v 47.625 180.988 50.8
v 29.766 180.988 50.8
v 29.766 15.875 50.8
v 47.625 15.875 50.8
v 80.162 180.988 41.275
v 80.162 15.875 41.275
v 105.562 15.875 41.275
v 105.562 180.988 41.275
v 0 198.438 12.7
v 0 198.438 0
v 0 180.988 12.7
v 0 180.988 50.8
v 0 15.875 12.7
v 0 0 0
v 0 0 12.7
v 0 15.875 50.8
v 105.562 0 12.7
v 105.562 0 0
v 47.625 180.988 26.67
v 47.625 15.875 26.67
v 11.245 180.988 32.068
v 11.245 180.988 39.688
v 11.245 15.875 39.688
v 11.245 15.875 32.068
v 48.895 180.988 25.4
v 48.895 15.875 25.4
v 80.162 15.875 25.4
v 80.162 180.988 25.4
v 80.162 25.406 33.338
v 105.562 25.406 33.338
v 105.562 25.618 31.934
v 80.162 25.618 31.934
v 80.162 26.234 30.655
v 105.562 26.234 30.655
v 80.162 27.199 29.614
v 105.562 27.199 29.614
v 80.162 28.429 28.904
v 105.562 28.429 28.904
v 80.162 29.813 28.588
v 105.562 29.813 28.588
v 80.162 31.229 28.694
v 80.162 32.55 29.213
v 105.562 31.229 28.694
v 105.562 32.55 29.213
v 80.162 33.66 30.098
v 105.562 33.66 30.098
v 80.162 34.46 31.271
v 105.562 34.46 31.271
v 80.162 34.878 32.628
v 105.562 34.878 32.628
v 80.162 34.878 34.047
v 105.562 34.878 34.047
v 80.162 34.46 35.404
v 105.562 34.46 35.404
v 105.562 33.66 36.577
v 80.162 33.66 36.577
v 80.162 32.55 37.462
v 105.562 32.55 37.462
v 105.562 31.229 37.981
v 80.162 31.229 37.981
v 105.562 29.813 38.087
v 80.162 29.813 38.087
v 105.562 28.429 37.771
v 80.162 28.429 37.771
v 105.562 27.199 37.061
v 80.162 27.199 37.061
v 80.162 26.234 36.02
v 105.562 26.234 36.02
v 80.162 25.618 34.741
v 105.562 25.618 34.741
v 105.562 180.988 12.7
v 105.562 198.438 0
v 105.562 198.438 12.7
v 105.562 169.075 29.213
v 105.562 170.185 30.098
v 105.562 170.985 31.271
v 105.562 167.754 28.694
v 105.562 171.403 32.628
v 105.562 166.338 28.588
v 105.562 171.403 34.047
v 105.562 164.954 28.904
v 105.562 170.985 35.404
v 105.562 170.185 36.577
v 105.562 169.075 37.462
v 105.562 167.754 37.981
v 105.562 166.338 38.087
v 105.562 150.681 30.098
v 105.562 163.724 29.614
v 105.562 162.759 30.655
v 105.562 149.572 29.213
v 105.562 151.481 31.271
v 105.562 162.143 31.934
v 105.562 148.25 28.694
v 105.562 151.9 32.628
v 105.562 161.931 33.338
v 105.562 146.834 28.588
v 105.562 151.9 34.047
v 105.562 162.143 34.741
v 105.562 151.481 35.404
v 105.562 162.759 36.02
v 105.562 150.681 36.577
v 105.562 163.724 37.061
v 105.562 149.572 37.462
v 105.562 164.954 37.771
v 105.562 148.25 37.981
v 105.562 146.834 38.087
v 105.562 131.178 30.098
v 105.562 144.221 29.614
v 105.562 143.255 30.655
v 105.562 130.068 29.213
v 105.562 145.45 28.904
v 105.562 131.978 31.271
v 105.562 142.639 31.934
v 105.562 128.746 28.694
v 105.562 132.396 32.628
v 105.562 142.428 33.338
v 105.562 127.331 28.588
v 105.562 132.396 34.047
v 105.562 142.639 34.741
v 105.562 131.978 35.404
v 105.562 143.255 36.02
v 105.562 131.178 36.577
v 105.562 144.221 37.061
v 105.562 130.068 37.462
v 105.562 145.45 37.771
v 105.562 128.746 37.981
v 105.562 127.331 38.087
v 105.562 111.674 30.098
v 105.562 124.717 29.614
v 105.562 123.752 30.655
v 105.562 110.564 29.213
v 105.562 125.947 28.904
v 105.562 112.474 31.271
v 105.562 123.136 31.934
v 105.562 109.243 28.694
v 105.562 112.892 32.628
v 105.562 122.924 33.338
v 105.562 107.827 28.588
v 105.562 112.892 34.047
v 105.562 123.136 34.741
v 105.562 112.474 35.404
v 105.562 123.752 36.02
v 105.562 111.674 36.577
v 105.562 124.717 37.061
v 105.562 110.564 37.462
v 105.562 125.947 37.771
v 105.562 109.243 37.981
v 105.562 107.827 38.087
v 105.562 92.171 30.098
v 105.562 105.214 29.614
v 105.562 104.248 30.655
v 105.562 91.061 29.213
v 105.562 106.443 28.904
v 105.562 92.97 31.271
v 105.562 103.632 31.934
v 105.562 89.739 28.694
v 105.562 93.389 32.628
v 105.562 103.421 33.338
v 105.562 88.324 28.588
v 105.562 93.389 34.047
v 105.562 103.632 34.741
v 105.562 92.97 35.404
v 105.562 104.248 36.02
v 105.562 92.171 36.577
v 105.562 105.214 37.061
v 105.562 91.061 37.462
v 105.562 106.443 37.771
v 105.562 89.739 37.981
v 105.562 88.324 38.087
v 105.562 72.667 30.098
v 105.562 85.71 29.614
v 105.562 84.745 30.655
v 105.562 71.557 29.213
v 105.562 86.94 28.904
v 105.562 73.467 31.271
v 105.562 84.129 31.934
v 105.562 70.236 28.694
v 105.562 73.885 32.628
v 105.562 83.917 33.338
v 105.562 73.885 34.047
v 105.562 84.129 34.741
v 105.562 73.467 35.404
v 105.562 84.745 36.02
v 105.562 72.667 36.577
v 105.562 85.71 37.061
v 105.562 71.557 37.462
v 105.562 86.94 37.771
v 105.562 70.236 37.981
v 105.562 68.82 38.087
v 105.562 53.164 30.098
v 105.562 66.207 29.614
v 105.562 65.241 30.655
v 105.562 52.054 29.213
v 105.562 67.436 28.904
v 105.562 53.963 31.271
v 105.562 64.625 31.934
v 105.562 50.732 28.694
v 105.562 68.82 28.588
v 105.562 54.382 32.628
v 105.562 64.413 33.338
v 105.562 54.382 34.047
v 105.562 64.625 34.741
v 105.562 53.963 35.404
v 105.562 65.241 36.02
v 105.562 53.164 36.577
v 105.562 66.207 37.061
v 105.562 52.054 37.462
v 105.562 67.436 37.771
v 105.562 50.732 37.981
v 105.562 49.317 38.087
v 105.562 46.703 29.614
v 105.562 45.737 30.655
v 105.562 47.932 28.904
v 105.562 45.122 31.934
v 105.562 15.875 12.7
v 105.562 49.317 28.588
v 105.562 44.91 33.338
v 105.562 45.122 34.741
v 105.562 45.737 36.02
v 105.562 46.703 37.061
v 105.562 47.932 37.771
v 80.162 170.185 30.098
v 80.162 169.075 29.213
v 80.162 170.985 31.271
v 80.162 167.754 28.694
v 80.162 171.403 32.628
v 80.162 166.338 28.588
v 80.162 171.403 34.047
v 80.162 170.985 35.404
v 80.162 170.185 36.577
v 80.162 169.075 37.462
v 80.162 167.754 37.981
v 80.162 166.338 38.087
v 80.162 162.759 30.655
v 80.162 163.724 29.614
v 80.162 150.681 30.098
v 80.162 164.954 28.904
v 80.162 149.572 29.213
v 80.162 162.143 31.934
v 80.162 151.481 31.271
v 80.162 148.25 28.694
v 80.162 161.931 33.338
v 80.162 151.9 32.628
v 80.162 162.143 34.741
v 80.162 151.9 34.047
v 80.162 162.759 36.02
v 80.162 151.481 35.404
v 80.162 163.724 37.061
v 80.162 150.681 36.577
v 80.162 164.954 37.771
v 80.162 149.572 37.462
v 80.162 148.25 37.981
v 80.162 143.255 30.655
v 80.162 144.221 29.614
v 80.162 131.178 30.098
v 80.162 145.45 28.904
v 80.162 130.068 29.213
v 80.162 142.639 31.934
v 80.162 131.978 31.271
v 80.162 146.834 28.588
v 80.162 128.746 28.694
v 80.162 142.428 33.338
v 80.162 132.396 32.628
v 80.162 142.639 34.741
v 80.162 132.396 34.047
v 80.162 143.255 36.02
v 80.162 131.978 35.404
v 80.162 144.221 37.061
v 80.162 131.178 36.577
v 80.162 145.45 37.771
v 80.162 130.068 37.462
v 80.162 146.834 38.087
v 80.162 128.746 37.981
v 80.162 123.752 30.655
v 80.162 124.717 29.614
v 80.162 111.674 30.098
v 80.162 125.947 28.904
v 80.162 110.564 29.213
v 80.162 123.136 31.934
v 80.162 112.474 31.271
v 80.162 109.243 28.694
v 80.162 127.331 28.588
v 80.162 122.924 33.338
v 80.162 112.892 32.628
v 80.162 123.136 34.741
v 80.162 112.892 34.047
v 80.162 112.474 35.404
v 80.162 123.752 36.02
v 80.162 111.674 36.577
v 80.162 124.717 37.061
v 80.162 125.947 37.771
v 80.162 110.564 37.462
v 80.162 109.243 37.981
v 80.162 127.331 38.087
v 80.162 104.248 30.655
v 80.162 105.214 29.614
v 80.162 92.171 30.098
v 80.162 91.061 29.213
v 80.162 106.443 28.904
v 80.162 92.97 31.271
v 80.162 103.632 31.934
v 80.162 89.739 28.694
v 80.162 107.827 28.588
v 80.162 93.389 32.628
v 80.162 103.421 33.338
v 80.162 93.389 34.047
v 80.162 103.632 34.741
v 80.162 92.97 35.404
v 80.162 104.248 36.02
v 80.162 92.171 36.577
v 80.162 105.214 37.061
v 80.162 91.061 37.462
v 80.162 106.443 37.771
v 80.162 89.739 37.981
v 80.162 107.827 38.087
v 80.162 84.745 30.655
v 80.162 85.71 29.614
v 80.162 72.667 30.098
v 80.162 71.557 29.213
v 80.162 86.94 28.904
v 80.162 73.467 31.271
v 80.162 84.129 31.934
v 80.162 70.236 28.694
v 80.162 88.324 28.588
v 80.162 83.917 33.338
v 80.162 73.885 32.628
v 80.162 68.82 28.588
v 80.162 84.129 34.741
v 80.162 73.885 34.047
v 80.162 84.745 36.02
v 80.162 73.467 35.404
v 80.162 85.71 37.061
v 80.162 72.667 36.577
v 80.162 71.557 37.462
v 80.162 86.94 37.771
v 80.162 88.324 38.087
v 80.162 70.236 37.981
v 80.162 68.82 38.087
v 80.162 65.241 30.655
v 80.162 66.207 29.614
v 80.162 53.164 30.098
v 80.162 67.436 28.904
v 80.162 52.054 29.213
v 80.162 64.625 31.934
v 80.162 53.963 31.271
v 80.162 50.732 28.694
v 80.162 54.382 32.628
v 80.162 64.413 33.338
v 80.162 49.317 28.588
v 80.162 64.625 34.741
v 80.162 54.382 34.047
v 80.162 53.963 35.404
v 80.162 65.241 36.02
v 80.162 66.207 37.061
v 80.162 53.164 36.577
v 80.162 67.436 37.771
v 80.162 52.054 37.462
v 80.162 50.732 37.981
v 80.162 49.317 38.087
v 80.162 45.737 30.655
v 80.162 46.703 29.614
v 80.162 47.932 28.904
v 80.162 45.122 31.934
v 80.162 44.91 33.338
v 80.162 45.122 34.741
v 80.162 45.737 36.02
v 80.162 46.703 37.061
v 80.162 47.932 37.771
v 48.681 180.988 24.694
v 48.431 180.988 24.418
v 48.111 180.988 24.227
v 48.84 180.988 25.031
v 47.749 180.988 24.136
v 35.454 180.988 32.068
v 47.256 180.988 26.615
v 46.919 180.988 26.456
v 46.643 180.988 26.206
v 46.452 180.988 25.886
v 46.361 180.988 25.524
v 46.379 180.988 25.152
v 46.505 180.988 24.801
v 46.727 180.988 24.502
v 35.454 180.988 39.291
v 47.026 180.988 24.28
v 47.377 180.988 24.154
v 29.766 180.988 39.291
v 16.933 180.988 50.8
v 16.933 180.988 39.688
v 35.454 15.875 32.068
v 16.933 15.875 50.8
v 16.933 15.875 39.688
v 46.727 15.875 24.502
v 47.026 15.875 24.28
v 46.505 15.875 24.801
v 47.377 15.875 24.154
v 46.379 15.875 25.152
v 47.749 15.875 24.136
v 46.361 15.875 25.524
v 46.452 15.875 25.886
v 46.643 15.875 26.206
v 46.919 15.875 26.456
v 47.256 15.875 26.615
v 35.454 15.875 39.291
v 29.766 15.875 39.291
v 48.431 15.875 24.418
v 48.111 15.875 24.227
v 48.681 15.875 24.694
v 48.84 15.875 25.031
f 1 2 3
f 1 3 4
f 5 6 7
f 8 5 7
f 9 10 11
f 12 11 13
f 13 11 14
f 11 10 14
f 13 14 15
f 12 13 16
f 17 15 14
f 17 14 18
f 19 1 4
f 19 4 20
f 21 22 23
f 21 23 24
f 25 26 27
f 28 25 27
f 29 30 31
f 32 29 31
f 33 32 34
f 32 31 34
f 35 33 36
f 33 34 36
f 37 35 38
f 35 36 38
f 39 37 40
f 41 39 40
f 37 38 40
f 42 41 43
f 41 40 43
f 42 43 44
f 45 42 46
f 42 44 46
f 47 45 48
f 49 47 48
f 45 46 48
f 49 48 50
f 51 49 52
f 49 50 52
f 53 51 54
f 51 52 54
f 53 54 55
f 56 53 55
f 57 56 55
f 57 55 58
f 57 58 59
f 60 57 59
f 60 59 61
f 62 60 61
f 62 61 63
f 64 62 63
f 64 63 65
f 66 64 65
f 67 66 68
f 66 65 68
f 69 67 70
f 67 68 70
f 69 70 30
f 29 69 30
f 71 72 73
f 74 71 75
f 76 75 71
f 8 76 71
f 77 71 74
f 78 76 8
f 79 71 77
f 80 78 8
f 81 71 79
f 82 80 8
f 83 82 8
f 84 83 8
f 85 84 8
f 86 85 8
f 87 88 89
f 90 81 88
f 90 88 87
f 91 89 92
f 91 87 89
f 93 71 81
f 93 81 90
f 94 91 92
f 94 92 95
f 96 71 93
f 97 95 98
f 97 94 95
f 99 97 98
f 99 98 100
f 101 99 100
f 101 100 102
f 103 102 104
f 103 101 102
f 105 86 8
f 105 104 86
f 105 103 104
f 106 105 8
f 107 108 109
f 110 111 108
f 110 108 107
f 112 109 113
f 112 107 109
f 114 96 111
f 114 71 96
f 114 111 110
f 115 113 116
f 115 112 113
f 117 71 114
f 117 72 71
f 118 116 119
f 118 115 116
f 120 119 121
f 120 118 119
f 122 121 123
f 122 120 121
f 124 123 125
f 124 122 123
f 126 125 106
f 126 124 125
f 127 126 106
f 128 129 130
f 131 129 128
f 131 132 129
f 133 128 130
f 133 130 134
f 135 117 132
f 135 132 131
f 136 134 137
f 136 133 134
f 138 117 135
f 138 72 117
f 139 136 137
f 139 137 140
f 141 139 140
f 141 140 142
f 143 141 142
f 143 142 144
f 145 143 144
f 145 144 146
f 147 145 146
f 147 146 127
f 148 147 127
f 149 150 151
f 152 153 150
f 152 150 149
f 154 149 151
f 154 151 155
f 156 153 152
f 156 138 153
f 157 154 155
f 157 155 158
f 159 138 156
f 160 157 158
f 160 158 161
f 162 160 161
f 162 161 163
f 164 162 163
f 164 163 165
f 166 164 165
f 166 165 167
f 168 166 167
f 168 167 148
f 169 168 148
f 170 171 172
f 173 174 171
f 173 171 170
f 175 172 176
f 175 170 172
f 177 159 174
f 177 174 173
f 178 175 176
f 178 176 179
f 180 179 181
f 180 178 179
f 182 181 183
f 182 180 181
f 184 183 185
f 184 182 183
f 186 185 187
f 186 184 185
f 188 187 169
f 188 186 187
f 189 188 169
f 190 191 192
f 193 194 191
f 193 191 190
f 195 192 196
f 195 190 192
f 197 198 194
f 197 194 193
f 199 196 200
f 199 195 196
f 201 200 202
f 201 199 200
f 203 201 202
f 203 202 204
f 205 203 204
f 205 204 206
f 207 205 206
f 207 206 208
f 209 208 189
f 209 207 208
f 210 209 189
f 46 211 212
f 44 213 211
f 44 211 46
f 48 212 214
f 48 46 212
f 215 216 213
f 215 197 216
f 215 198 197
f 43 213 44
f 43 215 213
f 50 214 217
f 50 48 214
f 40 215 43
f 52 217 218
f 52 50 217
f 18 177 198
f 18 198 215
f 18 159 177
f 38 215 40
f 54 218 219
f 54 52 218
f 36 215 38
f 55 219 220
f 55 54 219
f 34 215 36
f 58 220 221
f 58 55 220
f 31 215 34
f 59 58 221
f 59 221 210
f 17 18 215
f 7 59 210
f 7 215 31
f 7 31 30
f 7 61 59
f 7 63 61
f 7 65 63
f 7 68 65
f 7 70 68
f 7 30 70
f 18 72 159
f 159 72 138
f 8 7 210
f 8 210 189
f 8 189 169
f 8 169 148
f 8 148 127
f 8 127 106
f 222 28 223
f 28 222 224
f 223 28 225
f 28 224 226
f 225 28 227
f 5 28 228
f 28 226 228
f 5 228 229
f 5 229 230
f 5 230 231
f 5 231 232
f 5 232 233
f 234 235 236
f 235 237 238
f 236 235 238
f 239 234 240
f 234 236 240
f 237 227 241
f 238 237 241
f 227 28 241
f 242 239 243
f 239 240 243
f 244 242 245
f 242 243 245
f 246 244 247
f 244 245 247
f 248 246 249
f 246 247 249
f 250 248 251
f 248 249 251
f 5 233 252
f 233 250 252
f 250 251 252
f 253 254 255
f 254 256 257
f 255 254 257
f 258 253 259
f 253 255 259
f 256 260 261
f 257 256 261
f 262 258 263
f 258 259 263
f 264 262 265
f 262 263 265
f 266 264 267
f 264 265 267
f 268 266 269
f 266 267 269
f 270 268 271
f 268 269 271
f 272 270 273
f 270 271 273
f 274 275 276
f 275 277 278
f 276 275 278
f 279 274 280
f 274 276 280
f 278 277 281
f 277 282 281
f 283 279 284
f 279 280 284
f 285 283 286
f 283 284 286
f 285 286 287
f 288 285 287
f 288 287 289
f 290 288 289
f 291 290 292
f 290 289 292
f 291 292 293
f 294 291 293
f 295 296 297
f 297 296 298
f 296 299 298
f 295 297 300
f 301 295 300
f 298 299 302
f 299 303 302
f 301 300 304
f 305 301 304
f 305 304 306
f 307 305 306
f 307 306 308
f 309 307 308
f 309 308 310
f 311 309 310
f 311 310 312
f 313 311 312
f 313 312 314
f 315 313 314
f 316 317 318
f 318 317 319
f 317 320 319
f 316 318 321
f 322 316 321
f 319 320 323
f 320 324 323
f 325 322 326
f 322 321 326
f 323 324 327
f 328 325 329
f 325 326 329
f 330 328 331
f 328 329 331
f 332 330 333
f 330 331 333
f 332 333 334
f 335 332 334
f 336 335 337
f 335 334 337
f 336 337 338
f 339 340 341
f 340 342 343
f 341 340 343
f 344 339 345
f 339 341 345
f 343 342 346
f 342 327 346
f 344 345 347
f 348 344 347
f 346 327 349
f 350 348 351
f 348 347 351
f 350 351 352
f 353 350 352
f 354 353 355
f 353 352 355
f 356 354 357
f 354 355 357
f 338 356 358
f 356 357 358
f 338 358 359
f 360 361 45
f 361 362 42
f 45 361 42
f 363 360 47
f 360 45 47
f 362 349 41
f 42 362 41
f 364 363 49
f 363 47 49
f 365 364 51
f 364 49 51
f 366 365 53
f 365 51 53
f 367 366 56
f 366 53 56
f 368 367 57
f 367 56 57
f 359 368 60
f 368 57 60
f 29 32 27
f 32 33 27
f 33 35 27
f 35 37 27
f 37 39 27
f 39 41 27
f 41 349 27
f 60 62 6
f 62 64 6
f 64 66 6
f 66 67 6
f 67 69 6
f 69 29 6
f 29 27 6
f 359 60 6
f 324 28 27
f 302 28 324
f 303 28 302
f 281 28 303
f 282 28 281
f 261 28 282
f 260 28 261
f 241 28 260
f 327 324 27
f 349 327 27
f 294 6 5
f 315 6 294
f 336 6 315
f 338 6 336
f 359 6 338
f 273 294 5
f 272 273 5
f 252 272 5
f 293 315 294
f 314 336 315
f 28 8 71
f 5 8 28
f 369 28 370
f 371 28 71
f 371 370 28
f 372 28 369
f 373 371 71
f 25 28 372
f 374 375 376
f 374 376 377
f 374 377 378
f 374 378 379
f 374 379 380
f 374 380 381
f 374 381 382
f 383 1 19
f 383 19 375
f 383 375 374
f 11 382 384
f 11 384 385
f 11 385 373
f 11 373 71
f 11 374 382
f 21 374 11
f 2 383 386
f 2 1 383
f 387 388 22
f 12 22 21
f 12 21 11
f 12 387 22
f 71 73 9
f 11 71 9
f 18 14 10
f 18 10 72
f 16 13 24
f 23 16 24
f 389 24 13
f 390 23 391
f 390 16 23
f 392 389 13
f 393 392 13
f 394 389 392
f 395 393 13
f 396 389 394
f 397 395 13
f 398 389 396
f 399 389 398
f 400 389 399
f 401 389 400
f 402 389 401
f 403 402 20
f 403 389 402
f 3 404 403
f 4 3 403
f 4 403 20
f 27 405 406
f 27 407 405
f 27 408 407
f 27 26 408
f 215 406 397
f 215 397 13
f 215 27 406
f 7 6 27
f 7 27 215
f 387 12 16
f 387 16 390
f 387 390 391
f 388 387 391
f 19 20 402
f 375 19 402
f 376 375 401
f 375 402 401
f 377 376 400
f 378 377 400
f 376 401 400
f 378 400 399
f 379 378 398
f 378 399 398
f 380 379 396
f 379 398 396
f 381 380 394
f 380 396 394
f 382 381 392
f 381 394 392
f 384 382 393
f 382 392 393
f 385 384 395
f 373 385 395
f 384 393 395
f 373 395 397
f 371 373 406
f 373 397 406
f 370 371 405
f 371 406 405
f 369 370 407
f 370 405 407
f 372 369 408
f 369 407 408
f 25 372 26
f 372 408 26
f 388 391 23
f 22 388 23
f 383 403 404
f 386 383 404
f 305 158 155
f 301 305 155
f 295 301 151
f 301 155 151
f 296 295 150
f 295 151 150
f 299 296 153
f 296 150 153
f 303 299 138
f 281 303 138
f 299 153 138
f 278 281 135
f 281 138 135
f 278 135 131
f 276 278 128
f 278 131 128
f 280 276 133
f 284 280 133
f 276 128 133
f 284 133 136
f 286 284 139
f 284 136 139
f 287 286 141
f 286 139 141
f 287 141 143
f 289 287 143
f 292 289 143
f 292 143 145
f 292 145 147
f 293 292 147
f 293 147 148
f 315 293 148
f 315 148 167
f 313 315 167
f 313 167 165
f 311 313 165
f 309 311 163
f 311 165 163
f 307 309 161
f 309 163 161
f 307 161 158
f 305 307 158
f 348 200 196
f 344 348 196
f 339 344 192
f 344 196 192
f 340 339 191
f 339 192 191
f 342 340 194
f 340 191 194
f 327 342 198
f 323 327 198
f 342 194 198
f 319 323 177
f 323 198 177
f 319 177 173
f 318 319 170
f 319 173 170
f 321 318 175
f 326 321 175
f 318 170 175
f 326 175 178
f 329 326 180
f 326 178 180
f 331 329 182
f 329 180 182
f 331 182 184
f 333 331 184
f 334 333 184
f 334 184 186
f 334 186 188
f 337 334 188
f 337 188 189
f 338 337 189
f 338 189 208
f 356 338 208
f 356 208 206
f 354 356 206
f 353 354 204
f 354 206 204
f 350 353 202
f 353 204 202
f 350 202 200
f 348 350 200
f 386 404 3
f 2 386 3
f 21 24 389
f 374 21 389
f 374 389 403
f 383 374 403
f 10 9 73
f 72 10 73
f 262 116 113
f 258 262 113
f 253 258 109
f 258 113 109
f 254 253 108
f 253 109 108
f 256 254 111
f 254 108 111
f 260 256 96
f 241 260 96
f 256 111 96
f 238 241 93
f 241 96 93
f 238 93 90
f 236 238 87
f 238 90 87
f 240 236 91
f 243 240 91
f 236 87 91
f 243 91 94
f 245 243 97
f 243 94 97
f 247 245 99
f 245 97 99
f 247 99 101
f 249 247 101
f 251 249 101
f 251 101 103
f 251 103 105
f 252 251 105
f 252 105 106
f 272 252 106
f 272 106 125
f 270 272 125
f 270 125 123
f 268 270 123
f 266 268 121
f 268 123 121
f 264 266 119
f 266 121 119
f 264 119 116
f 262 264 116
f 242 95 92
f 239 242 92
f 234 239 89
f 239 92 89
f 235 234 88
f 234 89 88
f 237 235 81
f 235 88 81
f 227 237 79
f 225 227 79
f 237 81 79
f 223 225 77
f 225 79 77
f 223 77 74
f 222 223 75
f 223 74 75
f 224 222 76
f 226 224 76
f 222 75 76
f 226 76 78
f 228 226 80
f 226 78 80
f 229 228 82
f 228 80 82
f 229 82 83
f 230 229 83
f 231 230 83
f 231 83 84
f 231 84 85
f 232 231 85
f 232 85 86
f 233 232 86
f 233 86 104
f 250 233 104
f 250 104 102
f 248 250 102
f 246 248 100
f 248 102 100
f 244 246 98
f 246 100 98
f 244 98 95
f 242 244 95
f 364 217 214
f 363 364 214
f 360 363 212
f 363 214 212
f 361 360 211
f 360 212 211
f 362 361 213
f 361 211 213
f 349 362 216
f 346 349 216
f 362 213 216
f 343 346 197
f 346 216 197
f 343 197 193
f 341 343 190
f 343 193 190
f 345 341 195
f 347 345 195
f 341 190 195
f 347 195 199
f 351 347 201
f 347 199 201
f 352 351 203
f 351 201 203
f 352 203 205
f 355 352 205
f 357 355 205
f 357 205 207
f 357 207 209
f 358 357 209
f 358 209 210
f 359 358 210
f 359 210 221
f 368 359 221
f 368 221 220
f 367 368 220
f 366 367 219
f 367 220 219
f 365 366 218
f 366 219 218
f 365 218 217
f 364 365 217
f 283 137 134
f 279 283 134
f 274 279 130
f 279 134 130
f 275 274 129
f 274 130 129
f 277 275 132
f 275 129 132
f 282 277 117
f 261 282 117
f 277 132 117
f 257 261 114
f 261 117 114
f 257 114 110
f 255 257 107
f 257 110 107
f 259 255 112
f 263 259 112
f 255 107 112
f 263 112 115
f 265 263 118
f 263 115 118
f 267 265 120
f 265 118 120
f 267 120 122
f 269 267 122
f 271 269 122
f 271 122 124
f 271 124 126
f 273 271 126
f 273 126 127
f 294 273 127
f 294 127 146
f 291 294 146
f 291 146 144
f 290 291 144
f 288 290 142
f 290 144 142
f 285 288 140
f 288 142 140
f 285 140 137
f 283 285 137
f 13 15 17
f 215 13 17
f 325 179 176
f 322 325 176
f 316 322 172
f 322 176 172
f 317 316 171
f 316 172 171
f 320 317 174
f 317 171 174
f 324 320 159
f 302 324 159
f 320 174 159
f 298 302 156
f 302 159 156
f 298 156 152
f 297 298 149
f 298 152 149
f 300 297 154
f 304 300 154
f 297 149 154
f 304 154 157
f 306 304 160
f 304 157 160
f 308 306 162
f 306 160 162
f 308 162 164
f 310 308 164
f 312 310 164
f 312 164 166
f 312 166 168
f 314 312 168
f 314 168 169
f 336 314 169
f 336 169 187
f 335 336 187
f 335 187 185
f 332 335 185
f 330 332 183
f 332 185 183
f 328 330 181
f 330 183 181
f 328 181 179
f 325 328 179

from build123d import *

# Parameters (mm, degrees)
F0_W      = 105.5624
F0_H      = 50.8
F1_DEPTH  = 198.4375
F2_W      = 105.5624
F2_H      = 38.1
F3_DEPTH  = 15.875
F5_DEPTH  = 182.5635
F6_W      = 105.5624
F6_H      = 38.1
F7_DEPTH  = 17.4498
F9_DEPTH  = 25.4
F10_R     = 1.27
F11_DEPTH = 182.5635


with BuildPart() as f1:
    # F0 (on Front) → F1 (new body)
    with BuildSketch(Plane.XZ):
        with Locations((52.7812, 25.4)):
            Rectangle(F0_W, F0_H)
    extrude(amount=-F1_DEPTH)

    # F2 (on face) → F3 (cut)
    with BuildSketch(Plane.XZ):
        with Locations((52.7812, 31.75)):
            Rectangle(F2_W, F2_H)
    extrude(amount=-F3_DEPTH, mode=Mode.SUBTRACT)

    # F4 (on face) → F5 (cut, through all)
    with BuildSketch(Plane.XZ.offset(-15.875)):
        Polygon((29.765625, 50.8), (16.933333, 50.8), (16.933333, 39.6875), (11.244792, 39.6875), (11.244792, 32.0675), (35.454167, 32.0675), (35.454167, 39.290625), (29.765625, 39.290625), align=None)
        Polygon((105.5624, 50.8), (47.625, 50.8), (47.625, 25.4), (80.1624, 25.4), (80.1624, 41.275), (105.5624, 41.275), align=None)
    extrude(amount=-F5_DEPTH, mode=Mode.SUBTRACT)

    # F6 (on face) → F7 (cut)
    with BuildSketch(Plane(origin=(0, 198.4375, 0), x_dir=(-1, 0, 0), z_dir=(0, 1, 0))):
        with Locations((-52.7812, 31.75)):
            Rectangle(F6_W, F6_H)
    extrude(amount=-F7_DEPTH, mode=Mode.SUBTRACT)

    # F8 (on face) → F9 (cut, through all)
    with BuildSketch(Plane.YZ.offset(105.5624)):
        with BuildLine():
            Line((30.16885, 33.3375), (34.93135, 33.3375))
            ThreePointArc((34.93135, 33.3375), (30.16885, 38.1), (25.40635, 33.3375))
            Line((25.40635, 33.3375), (30.16885, 33.3375))
        make_face()
        with BuildLine():
            ThreePointArc((25.40635, 33.3375), (30.16885, 28.575), (34.93135, 33.3375))
            Line((34.93135, 33.3375), (30.16885, 33.3375))
            Line((30.16885, 33.3375), (25.40635, 33.3375))
        make_face()
        with BuildLine():
            ThreePointArc((171.45635, 33.3375), (166.69385, 38.1), (161.93135, 33.3375))
            Line((161.93135, 33.3375), (166.69385, 33.3375))
            Line((166.69385, 33.3375), (171.45635, 33.3375))
        make_face()
        with BuildLine():
            Line((166.69385, 33.3375), (161.93135, 33.3375))
            ThreePointArc((161.93135, 33.3375), (166.69385, 28.575), (171.45635, 33.3375))
            Line((171.45635, 33.3375), (166.69385, 33.3375))
        make_face()
        with BuildLine():
            ThreePointArc((151.952779, 33.3375), (147.190279, 38.1), (142.427779, 33.3375))
            Line((142.427779, 33.3375), (147.190279, 33.3375))
            Line((147.190279, 33.3375), (151.952779, 33.3375))
        make_face()
        with BuildLine():
            Line((147.190279, 33.3375), (142.427779, 33.3375))
            ThreePointArc((142.427779, 33.3375), (147.190279, 28.575), (151.952779, 33.3375))
            Line((151.952779, 33.3375), (147.190279, 33.3375))
        make_face()
        with BuildLine():
            ThreePointArc((132.449207, 33.3375), (127.686707, 38.1), (122.924207, 33.3375))
            Line((122.924207, 33.3375), (127.686707, 33.3375))
            Line((127.686707, 33.3375), (132.449207, 33.3375))
        make_face()
        with BuildLine():
            Line((127.686707, 33.3375), (122.924207, 33.3375))
            ThreePointArc((122.924207, 33.3375), (127.686707, 28.575), (132.449207, 33.3375))
            Line((132.449207, 33.3375), (127.686707, 33.3375))
        make_face()
        with BuildLine():
            ThreePointArc((112.945636, 33.3375), (108.183136, 38.1), (103.420636, 33.3375))
            Line((103.420636, 33.3375), (108.183136, 33.3375))
            Line((108.183136, 33.3375), (112.945636, 33.3375))
        make_face()
        with BuildLine():
            Line((108.183136, 33.3375), (103.420636, 33.3375))
            ThreePointArc((103.420636, 33.3375), (108.183136, 28.575), (112.945636, 33.3375))
            Line((112.945636, 33.3375), (108.183136, 33.3375))
        make_face()
        with BuildLine():
            ThreePointArc((93.442064, 33.3375), (88.679564, 38.1), (83.917064, 33.3375))
            Line((83.917064, 33.3375), (88.679564, 33.3375))
            Line((88.679564, 33.3375), (93.442064, 33.3375))
        make_face()
        with BuildLine():
            Line((88.679564, 33.3375), (83.917064, 33.3375))
            ThreePointArc((83.917064, 33.3375), (88.679564, 28.575), (93.442064, 33.3375))
            Line((93.442064, 33.3375), (88.679564, 33.3375))
        make_face()
        with BuildLine():
            ThreePointArc((73.938493, 33.3375), (69.175993, 38.1), (64.413493, 33.3375))
            Line((64.413493, 33.3375), (69.175993, 33.3375))
            Line((69.175993, 33.3375), (73.938493, 33.3375))
        make_face()
        with BuildLine():
            Line((69.175993, 33.3375), (64.413493, 33.3375))
            ThreePointArc((64.413493, 33.3375), (69.175993, 28.575), (73.938493, 33.3375))
            Line((73.938493, 33.3375), (69.175993, 33.3375))
        make_face()
        with BuildLine():
            ThreePointArc((54.434921, 33.3375), (49.672421, 38.1), (44.909921, 33.3375))
            Line((44.909921, 33.3375), (49.672421, 33.3375))
            Line((49.672421, 33.3375), (54.434921, 33.3375))
        make_face()
        with BuildLine():
            Line((49.672421, 33.3375), (44.909921, 33.3375))
            ThreePointArc((44.909921, 33.3375), (49.672421, 28.575), (54.434921, 33.3375))
            Line((54.434921, 33.3375), (49.672421, 33.3375))
        make_face()
    extrude(amount=-F9_DEPTH, mode=Mode.SUBTRACT)

    # F10 (on face) → F11 (cut, through all)
    with BuildSketch(Plane.XZ.offset(-15.875)):
        with Locations((47.625, 25.4)):
            Circle(F10_R)
    extrude(amount=-F11_DEPTH, mode=Mode.SUBTRACT)


solid = f1.part
